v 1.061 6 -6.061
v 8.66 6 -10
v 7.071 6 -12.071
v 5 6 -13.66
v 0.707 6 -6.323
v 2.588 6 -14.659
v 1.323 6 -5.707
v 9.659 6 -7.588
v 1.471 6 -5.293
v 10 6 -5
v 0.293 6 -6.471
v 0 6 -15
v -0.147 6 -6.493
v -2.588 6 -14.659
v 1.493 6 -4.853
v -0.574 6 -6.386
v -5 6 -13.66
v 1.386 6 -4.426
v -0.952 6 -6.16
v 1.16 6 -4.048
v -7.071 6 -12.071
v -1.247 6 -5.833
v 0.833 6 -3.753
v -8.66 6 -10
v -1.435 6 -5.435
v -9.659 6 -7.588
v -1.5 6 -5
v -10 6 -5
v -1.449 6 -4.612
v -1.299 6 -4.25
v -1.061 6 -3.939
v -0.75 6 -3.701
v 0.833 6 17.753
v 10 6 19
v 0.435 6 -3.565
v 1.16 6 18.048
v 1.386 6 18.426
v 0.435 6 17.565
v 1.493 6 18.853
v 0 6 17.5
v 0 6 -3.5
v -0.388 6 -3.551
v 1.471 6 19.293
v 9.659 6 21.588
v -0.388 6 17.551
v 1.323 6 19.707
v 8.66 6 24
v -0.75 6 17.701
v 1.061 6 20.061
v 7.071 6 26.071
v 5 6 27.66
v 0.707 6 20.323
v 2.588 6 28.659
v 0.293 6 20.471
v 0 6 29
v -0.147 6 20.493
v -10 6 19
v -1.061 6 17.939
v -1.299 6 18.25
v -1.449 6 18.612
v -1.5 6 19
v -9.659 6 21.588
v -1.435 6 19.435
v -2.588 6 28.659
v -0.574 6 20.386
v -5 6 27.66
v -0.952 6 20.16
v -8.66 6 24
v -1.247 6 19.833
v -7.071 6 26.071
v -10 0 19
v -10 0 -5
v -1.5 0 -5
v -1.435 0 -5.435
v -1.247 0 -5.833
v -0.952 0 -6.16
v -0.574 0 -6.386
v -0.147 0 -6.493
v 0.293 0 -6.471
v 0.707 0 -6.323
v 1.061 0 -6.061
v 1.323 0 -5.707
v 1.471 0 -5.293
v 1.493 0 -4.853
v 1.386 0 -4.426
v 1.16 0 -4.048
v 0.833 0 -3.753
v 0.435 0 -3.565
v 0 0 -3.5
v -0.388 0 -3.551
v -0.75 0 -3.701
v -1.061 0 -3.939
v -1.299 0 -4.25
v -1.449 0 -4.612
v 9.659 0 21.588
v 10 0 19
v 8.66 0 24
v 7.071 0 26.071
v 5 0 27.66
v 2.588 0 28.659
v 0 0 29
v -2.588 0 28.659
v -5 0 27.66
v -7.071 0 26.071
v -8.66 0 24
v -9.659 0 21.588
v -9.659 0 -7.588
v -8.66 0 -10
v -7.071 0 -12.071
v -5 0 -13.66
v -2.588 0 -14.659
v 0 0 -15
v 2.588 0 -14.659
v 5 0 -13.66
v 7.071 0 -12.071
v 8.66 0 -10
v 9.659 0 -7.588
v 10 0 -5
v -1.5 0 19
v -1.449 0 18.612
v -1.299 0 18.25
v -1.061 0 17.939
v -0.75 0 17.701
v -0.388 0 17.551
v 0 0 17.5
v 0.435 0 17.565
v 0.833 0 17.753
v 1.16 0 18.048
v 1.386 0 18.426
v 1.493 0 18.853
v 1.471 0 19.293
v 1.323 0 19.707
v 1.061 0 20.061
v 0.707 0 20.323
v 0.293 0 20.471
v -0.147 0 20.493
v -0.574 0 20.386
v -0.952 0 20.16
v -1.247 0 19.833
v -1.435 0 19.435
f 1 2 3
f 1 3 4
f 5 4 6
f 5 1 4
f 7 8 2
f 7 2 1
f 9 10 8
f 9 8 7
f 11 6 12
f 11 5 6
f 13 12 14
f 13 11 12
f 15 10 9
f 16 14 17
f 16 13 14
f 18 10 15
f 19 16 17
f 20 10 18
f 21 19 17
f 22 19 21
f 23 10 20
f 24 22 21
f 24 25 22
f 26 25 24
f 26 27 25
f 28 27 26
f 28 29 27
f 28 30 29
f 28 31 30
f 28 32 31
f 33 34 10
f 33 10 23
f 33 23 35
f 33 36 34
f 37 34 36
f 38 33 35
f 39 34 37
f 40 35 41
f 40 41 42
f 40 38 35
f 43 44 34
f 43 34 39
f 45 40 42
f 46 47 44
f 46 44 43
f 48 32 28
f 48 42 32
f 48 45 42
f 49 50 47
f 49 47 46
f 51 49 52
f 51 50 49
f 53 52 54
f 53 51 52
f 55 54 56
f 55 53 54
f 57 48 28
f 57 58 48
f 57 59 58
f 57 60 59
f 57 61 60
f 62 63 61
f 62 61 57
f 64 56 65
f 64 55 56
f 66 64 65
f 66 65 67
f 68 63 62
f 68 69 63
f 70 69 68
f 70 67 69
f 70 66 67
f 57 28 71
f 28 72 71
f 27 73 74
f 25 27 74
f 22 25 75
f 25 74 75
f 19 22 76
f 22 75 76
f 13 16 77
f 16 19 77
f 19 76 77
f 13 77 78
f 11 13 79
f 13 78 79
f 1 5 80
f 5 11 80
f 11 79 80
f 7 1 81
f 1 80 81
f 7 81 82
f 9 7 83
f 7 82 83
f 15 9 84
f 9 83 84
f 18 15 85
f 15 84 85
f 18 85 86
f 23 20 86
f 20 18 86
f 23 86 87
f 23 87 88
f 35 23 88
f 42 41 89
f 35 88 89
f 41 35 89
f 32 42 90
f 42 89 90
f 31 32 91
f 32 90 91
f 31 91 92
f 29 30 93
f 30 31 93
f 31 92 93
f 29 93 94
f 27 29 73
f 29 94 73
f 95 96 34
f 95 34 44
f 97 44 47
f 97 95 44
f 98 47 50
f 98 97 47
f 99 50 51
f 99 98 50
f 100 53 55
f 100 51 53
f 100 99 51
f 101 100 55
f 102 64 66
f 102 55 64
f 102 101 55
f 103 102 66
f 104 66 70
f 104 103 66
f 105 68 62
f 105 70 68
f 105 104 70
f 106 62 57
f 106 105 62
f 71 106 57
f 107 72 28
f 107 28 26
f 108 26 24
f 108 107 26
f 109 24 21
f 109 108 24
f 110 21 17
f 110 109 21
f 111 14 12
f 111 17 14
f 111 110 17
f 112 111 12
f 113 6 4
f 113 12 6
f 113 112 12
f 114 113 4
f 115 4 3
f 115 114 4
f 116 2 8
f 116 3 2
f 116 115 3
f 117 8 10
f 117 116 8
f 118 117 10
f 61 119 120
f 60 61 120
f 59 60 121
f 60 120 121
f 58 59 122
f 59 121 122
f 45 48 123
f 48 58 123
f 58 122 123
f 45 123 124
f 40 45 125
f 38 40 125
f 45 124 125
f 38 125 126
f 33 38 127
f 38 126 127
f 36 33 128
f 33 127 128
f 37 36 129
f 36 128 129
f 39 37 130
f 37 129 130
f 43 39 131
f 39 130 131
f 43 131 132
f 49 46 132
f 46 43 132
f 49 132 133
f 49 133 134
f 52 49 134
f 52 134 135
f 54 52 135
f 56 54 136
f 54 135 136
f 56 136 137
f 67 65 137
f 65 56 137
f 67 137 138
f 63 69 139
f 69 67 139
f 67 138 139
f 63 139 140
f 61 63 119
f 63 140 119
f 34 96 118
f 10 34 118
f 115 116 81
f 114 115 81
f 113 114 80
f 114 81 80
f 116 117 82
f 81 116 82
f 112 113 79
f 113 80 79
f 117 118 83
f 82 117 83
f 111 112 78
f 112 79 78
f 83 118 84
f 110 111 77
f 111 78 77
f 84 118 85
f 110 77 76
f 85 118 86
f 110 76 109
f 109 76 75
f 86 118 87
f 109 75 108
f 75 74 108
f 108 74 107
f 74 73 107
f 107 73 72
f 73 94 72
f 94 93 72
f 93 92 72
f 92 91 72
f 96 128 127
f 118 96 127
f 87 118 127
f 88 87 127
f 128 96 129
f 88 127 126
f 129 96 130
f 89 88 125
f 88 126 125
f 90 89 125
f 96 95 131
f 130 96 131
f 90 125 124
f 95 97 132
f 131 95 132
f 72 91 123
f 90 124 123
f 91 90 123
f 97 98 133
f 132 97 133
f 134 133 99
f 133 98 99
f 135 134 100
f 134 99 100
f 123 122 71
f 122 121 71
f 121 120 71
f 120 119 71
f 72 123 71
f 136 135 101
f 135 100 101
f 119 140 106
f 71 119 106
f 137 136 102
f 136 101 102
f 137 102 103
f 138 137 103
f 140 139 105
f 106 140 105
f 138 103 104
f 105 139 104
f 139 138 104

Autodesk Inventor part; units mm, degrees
ref_plane "YZ Plane" through (0, 0, 0) normal (1, 0, 0) x (0, 1, 0)
ref_plane "XZ Plane" through (0, 0, 0) normal (0, 1, 0) x (-1, 0, 0)
ref_plane "XY Plane" through (0, 0, 0) normal (0, 0, 1) x (1, 0, 0)
sketch "Sketch1" plane through (0, 0, 0) normal (0, 1, 0) x (-1, 0, 0)
  line L0 (0, 0) -> (-5.6352, 0)
  line L1 (-5.6352, 0) -> (0, 0)
  line L2 (0, 0) -> (0, 8.7024)
  line L3 (6.5, 14) -> (-6.5, 14)
  line L4 (-6.5, 14) -> (-6.5, 0)
  line L5 (-6.5, 0) -> (6.5, 0)
  line L6 (6.5, 0) -> (6.5, 14)
  circle A0 centre (0, -5) radius 1.5
  circle A1 centre (0, 19) radius 1.5
  line L7 (0, 19) -> (0, -5)
  line L8 (0, 19) -> (0, -5) construction
  line L9 (-10, 19) -> (-10, -5)
  line L10 (10, -5) -> (10, 19)
  arc A2 (10, 19) -> (-10, 19) centre (0, 19) ccw
  arc A3 (-10, -5) -> (10, -5) centre (0, -5) ccw
  point P0 (0, -8.7024)
  point P1 (0, 7)
  dimension "d25" = 13
  dimension "d26" = 14
  dimension "d30" = 5
  dimension "d31" = 5
  dimension "d32" = 3
  dimension "d33" = 20
extrude "Extrusion1" add sketch "Sketch1" along normal blind 6 contours L0 L5 L4 L3 L7 L2 | L2 L7 L3 L6 L5 | A2 L10 A3 L9
properties part number "case_usb_cap" material "Acrylic, Clear"
